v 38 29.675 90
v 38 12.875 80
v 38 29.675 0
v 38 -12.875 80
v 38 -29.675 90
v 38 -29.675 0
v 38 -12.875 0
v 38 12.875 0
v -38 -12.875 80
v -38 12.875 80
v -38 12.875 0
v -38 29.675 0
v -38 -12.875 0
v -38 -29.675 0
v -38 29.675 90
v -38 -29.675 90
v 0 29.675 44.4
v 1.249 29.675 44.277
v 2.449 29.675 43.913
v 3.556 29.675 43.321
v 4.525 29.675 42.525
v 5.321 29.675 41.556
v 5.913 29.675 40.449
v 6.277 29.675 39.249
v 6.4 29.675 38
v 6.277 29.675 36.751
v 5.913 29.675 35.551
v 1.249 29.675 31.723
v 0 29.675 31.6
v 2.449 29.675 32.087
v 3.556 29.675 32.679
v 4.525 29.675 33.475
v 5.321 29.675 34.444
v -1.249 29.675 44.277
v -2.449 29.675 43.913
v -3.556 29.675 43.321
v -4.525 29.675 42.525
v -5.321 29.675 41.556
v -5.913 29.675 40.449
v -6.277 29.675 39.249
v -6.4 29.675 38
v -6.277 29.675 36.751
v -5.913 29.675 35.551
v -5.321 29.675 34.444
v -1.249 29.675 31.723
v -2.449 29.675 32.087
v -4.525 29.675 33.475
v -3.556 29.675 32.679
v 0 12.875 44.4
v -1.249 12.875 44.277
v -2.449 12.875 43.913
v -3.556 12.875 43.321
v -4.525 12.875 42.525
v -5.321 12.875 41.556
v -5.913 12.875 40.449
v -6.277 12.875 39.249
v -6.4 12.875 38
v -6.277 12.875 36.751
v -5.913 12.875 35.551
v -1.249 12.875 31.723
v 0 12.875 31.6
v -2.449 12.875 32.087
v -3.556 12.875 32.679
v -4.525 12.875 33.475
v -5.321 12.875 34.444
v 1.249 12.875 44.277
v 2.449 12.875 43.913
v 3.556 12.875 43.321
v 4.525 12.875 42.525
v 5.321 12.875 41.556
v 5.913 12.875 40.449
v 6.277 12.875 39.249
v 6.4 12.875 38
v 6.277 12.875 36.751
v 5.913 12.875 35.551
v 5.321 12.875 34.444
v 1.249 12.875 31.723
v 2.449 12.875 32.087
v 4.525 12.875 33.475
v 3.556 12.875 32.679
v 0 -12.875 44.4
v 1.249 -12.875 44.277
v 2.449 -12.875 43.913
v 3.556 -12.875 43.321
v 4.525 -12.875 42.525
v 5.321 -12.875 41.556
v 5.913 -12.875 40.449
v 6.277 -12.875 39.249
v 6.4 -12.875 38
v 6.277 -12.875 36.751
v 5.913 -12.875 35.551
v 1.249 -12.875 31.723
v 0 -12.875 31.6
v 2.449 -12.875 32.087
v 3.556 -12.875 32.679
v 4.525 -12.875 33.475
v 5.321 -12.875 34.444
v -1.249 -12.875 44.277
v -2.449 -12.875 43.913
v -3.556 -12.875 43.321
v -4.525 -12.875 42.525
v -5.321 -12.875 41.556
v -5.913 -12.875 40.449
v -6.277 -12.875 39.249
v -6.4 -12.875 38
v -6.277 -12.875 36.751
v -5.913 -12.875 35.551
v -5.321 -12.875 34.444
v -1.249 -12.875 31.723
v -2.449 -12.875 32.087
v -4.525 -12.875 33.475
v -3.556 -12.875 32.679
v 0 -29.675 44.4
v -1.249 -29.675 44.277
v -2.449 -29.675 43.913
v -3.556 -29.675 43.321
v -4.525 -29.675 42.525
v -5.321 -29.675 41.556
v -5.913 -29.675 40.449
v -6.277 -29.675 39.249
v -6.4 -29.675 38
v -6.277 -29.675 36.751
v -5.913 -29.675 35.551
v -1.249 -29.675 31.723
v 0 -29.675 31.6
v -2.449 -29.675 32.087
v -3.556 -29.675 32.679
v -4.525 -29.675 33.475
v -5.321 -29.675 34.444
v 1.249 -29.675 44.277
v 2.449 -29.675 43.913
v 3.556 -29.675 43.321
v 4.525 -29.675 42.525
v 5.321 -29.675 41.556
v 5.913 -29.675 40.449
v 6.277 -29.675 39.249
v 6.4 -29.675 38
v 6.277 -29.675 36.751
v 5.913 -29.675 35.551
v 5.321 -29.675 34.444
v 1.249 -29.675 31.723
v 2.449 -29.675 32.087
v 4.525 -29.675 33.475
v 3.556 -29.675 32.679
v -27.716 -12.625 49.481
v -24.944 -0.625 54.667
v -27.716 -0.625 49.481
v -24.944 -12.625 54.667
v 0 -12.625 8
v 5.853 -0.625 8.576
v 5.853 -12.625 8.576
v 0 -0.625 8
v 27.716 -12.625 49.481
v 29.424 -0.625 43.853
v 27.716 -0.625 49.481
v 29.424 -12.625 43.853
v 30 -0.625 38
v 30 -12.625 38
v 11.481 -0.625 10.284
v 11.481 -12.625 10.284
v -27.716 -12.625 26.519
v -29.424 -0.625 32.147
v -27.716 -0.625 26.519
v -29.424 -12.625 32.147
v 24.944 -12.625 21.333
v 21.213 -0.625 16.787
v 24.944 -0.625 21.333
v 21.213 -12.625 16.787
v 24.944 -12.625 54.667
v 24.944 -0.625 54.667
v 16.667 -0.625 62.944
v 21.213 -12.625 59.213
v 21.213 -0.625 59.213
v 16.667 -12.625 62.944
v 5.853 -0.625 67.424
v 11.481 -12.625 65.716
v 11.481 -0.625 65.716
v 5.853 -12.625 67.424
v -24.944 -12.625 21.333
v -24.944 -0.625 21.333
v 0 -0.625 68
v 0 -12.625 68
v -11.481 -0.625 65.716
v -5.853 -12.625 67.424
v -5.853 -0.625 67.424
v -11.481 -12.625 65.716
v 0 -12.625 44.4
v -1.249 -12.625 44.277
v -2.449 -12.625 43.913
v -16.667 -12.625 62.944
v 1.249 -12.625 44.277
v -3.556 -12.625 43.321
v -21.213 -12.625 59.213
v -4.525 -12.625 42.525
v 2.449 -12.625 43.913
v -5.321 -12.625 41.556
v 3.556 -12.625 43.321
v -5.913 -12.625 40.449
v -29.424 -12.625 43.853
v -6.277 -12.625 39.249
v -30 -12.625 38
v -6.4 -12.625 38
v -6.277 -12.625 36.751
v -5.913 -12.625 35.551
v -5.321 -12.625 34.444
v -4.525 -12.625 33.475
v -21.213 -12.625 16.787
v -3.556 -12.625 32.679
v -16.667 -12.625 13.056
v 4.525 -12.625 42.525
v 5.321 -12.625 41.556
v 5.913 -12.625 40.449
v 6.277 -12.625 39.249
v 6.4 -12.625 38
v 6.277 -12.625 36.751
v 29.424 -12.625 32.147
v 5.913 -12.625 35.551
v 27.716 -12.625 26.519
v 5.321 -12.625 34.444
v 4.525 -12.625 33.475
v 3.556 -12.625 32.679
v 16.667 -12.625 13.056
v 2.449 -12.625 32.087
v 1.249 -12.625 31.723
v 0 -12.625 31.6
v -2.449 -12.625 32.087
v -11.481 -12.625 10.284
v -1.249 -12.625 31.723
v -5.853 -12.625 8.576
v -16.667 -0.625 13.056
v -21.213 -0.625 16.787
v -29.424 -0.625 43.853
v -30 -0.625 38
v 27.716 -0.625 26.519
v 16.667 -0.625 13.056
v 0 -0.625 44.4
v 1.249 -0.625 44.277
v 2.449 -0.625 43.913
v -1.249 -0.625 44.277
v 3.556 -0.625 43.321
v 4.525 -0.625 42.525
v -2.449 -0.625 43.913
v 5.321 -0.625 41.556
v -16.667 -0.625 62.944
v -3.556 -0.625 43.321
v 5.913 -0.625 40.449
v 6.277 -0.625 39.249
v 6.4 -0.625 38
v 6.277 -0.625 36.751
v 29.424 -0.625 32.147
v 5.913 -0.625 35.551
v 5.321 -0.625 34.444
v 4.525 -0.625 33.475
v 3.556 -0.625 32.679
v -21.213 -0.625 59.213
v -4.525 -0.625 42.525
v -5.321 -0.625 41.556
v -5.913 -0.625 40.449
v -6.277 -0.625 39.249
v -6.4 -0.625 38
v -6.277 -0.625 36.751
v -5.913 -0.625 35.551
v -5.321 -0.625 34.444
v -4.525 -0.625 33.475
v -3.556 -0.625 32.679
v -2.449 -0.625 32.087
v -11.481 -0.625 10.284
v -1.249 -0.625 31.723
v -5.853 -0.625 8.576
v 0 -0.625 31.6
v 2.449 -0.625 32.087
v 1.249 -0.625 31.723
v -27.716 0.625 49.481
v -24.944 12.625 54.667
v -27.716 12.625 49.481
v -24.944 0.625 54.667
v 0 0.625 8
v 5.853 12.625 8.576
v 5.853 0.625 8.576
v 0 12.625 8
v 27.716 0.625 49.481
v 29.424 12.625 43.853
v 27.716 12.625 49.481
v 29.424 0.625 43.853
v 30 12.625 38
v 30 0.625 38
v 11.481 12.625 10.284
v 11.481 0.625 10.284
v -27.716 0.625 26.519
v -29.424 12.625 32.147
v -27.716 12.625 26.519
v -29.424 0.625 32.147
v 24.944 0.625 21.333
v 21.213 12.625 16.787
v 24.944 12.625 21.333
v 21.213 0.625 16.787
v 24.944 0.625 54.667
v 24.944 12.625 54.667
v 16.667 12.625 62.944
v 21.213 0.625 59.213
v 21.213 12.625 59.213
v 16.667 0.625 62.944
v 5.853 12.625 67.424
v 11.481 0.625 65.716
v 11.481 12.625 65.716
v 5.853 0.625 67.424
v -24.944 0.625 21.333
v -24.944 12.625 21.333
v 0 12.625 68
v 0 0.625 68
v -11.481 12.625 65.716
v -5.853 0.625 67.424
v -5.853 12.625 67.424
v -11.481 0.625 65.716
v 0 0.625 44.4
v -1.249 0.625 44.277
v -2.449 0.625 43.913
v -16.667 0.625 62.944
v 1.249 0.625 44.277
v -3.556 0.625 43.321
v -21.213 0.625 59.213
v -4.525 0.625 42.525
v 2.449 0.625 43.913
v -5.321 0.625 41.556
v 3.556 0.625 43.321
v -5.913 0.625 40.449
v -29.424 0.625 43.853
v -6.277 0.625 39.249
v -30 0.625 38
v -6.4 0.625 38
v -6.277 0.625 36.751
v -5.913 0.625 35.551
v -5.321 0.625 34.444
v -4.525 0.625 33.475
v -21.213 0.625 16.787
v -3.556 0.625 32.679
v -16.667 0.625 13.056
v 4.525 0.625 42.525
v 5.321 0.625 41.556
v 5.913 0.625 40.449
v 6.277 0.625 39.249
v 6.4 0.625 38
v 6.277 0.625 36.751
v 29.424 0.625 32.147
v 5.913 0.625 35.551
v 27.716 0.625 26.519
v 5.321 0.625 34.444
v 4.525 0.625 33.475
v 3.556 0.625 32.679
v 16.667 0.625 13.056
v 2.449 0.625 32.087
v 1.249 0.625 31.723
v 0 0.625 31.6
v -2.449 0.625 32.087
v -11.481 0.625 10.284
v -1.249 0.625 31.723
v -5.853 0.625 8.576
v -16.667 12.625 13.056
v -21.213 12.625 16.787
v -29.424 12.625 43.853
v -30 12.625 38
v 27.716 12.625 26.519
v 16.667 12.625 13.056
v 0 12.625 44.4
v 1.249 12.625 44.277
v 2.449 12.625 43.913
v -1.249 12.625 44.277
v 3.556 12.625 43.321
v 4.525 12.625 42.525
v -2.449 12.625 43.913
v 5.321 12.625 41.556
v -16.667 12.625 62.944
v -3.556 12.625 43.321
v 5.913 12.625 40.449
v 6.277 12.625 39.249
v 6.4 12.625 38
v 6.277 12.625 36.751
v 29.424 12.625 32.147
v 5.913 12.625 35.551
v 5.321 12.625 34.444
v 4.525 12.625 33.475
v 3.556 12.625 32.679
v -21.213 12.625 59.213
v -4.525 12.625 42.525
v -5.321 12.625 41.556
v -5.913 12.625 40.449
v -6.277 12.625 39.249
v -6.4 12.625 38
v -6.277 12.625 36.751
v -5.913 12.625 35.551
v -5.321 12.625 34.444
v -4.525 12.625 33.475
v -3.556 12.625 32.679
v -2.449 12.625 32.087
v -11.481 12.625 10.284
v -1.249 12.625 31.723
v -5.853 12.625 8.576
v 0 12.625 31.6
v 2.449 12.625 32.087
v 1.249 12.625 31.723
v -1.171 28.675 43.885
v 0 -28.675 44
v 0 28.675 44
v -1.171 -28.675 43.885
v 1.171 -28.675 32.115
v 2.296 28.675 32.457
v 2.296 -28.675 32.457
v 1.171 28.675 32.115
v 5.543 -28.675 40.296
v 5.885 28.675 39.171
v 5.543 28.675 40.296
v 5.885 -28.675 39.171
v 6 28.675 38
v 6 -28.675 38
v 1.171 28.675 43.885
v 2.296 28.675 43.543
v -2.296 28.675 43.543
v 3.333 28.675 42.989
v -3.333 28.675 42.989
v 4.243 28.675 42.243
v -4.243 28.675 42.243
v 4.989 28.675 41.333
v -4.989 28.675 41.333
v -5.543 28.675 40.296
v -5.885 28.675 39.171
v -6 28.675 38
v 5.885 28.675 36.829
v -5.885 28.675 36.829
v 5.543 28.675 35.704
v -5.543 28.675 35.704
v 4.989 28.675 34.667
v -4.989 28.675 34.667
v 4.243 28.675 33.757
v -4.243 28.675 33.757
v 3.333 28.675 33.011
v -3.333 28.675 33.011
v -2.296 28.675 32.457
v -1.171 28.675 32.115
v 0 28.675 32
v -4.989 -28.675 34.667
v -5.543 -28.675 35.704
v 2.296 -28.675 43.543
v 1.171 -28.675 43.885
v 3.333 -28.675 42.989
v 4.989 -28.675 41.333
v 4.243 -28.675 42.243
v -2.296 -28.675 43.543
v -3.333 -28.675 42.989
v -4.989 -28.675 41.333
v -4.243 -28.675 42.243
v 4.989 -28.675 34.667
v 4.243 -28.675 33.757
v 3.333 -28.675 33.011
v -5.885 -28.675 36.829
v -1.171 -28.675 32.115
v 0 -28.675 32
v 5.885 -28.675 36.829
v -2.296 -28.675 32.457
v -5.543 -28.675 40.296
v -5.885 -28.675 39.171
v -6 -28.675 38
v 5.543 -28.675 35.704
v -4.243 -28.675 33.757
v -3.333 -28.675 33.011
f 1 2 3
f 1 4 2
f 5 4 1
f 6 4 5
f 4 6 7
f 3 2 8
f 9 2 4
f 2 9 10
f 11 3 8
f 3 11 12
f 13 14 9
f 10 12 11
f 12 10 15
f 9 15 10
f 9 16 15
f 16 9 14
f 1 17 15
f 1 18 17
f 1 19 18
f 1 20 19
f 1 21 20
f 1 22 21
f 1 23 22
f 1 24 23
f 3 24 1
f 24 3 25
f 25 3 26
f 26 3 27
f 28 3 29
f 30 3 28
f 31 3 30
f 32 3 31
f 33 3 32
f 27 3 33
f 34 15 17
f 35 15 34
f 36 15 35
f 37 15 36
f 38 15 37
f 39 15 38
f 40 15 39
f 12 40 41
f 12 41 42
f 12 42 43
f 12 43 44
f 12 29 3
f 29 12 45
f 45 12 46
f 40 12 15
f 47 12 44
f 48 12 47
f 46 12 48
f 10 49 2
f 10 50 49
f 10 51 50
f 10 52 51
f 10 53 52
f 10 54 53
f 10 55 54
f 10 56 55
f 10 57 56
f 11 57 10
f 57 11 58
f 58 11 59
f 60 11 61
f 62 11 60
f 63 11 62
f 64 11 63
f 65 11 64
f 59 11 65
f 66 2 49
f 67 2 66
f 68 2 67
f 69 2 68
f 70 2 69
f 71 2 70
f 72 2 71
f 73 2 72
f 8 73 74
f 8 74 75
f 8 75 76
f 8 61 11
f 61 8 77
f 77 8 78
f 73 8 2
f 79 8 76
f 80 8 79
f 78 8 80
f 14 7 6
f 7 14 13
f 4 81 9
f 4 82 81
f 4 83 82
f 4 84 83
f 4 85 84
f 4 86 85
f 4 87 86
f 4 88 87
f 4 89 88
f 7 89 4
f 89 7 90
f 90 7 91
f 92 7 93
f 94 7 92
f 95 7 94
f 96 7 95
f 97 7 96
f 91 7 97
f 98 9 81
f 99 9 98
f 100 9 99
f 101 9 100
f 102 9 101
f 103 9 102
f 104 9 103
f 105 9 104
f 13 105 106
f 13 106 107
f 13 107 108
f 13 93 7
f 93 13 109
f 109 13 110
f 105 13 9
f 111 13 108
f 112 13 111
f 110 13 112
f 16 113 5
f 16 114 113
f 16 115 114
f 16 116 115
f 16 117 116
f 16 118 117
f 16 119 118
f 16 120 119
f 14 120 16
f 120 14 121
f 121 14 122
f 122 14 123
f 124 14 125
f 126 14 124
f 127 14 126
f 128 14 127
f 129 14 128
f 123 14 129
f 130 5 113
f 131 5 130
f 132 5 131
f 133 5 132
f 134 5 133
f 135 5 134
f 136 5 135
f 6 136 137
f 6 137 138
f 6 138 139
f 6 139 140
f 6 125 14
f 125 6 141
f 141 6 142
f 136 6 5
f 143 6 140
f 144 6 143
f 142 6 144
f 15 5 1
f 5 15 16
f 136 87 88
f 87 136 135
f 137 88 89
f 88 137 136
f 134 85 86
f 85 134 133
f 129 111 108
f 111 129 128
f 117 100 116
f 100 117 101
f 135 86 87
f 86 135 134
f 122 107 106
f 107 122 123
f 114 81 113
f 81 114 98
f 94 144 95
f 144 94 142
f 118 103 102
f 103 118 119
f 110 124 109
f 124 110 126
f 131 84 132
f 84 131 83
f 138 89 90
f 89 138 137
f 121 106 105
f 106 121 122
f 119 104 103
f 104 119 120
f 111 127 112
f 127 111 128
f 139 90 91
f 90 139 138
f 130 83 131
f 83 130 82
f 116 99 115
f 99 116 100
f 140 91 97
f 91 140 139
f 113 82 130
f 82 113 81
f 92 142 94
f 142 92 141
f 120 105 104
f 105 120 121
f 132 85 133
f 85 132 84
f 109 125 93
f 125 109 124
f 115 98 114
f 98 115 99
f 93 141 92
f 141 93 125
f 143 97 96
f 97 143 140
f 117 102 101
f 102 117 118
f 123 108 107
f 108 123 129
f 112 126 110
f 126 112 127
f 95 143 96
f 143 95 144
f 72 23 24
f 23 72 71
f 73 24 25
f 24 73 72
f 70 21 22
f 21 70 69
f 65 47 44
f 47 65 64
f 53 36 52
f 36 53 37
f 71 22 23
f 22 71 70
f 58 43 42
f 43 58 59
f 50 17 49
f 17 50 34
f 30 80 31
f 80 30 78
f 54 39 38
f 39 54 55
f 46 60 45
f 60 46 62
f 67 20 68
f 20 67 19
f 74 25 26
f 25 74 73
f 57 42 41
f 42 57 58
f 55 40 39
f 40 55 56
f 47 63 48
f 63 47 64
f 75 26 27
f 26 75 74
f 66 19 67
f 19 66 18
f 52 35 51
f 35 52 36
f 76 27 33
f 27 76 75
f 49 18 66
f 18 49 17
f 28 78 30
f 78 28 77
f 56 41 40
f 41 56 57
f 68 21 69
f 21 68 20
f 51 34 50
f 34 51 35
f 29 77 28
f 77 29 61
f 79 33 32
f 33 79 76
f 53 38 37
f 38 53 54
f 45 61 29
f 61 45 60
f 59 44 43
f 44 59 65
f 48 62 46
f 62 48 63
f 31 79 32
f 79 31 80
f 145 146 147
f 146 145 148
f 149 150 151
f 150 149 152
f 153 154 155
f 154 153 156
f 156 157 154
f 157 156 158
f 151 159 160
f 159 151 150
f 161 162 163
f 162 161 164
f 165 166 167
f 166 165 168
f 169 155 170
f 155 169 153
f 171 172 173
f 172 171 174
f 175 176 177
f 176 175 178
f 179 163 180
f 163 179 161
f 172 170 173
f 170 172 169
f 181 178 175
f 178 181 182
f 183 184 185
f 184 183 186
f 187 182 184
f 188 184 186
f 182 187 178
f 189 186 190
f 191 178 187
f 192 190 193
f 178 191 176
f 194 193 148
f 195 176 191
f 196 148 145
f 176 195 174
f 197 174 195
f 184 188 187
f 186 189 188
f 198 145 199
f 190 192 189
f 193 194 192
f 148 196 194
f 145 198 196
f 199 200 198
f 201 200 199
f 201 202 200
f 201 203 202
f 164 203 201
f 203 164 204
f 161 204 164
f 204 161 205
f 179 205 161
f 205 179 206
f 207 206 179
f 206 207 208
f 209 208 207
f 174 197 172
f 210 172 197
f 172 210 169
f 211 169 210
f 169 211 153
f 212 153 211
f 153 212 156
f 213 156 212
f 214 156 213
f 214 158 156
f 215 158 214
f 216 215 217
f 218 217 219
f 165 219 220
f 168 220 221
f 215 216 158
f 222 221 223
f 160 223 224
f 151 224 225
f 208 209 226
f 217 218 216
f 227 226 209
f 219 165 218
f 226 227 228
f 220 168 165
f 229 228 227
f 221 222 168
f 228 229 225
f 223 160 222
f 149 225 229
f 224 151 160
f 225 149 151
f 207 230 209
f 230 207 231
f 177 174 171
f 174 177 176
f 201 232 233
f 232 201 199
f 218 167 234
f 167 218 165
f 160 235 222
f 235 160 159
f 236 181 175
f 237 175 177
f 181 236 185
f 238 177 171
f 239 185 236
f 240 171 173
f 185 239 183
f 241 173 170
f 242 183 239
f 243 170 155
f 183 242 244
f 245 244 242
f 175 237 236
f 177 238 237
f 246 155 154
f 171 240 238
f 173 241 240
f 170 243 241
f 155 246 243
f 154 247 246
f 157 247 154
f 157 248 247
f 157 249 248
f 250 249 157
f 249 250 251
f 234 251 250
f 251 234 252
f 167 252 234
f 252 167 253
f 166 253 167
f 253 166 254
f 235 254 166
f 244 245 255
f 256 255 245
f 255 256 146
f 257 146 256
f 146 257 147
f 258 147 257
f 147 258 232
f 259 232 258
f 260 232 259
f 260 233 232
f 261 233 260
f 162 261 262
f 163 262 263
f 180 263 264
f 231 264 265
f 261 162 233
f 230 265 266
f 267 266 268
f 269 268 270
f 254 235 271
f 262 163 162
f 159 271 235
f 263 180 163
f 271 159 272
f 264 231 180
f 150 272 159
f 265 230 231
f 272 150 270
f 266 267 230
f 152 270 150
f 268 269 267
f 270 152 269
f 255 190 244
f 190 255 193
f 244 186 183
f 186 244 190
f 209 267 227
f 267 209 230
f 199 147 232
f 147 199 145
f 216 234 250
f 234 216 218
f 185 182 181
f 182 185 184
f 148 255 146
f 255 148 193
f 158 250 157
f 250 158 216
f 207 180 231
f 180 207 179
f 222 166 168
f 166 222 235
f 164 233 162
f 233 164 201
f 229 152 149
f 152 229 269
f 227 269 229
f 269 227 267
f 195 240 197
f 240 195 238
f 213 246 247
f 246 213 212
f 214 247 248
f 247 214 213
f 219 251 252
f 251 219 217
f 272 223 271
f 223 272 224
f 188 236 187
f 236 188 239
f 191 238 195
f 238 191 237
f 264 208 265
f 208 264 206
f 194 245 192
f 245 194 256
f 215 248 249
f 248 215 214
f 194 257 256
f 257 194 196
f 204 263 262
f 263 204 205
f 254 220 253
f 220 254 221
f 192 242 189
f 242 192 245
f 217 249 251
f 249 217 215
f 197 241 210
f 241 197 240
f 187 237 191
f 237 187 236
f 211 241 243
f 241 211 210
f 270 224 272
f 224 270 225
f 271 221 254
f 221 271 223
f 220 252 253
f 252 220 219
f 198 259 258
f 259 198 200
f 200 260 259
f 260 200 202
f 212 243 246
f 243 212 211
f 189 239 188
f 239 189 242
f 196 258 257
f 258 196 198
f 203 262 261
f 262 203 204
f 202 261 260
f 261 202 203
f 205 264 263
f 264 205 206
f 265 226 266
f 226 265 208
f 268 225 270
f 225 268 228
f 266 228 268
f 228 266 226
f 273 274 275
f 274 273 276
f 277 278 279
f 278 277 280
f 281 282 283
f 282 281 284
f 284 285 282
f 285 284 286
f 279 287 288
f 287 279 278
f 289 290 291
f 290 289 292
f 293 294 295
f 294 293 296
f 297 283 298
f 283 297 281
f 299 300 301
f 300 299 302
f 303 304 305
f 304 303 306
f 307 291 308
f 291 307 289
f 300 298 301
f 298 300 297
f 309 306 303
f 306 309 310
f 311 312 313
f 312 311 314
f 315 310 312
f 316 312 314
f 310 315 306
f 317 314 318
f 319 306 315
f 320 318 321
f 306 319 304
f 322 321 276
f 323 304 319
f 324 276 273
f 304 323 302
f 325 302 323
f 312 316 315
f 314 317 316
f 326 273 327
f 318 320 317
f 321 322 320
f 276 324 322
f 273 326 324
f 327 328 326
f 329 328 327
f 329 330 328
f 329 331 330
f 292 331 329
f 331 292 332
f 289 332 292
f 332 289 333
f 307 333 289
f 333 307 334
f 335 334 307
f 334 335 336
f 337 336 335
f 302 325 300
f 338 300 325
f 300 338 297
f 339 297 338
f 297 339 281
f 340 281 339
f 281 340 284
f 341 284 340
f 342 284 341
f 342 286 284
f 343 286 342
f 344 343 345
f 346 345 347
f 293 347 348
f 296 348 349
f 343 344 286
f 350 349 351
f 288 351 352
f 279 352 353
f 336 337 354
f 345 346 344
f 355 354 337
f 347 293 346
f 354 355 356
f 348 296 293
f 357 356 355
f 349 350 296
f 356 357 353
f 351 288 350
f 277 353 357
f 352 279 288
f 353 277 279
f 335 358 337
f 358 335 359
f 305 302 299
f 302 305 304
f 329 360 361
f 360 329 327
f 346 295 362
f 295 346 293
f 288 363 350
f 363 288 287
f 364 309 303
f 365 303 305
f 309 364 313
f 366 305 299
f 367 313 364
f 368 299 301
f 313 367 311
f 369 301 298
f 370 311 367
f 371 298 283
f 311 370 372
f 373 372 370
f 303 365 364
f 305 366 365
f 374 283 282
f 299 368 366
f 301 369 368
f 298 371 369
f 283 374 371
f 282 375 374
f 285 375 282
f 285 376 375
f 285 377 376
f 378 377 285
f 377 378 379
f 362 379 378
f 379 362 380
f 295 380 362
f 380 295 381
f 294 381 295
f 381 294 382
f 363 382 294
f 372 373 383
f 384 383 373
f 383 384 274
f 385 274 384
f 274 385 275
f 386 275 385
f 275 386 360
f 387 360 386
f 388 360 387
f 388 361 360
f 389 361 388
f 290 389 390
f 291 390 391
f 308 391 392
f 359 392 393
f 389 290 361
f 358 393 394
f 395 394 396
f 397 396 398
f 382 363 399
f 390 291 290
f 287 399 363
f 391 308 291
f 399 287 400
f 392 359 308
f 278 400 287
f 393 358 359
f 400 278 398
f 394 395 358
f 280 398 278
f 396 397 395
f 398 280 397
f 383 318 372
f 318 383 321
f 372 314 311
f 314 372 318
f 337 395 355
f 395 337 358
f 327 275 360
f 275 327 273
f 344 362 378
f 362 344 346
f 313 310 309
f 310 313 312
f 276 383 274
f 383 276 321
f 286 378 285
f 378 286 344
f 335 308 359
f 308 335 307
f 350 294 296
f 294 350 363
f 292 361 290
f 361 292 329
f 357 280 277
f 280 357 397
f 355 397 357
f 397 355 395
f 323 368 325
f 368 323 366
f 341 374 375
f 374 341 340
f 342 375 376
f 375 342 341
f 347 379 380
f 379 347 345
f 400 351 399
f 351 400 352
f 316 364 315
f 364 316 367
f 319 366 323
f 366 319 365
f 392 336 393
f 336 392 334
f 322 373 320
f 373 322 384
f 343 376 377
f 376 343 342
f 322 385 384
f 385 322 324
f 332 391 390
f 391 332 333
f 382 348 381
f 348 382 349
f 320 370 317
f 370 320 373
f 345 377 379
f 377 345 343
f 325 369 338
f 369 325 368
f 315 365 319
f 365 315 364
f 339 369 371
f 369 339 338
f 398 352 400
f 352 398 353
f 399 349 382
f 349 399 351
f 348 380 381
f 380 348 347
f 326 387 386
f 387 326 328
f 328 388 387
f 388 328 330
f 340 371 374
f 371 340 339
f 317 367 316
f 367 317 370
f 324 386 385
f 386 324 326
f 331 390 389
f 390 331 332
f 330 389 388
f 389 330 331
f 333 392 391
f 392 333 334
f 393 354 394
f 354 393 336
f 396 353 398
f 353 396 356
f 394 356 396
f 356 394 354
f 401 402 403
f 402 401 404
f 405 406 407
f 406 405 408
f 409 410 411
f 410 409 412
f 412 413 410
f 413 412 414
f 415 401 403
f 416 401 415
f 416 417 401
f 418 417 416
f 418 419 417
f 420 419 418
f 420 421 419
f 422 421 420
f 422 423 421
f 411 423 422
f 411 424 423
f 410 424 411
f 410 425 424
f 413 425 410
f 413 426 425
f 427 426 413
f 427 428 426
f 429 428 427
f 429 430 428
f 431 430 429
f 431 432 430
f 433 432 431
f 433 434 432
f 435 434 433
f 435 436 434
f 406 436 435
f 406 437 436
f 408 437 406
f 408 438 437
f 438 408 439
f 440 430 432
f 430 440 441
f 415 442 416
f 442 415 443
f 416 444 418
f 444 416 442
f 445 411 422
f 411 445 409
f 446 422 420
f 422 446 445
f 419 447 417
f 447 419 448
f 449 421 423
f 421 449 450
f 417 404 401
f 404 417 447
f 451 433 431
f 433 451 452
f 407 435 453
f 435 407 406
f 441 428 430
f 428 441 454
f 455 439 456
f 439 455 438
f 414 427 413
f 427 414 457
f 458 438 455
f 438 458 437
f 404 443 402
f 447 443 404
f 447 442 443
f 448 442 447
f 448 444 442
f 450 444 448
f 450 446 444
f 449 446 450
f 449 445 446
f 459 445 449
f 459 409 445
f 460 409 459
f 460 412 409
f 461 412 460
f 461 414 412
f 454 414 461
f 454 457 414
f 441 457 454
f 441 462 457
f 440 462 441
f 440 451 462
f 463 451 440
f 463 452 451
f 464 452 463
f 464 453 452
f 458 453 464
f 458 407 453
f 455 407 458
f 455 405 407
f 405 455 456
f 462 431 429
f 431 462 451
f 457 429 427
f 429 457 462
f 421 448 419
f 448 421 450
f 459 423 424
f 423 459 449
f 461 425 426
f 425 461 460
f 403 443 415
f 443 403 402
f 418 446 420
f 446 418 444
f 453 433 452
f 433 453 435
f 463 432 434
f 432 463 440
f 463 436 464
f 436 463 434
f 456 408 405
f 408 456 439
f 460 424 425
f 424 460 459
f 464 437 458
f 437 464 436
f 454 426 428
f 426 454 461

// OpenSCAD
$fn = 32;

// ------------------------------------------------------------------------
// Trolley wheel set: wheels d60, fork 80 mm tall
// Every part is its own module, assembly() places every instance.
// ------------------------------------------------------------------------

// --- part 1 ---
module trolley_fork() {
  difference() {
    union() {
      translate([-38, 12.875, 0]) cube([76, 16.8, 80]);
      translate([-38, -29.675, 0]) cube([76, 16.8, 80]);
      translate([-38, -29.675, 80]) cube([76, 59.35, 10]);
    }
    translate([0, -21.275, 38]) rotate([90, 0, 0]) cylinder(h = 18.8, d = 12.8, center = true);
    translate([0, 21.275, 38]) rotate([90, 0, 0]) cylinder(h = 18.8, d = 12.8, center = true);
  }
}

// --- part 2 ---
module trolley_wheel() {
  difference() {
      translate([0, 0, 0]) cylinder(h = 12, d = 60);
      translate([0, 0, -1]) cylinder(h = 14, d = 12.8);
    }
}

// --- part 3 ---
module trolley_axle() {
  translate([0, 0, -28.675]) cylinder(h = 57.35, d = 12);
}

// --- assembly ---
module assembly() {
  color([0.80, 0.24, 0.20]) translate([0, 0, 0]) rotate([0, 0, 0]) trolley_fork();
  color([0.20, 0.45, 0.75]) translate([0, -0.625, 38]) rotate([90, 0, 0]) trolley_wheel();
  color([0.25, 0.62, 0.32]) translate([0, 12.625, 38]) rotate([90, 0, 0]) trolley_wheel();
  color([0.92, 0.70, 0.18]) translate([0, 0, 38]) rotate([90, 0, 0]) trolley_axle();
}

assembly();
